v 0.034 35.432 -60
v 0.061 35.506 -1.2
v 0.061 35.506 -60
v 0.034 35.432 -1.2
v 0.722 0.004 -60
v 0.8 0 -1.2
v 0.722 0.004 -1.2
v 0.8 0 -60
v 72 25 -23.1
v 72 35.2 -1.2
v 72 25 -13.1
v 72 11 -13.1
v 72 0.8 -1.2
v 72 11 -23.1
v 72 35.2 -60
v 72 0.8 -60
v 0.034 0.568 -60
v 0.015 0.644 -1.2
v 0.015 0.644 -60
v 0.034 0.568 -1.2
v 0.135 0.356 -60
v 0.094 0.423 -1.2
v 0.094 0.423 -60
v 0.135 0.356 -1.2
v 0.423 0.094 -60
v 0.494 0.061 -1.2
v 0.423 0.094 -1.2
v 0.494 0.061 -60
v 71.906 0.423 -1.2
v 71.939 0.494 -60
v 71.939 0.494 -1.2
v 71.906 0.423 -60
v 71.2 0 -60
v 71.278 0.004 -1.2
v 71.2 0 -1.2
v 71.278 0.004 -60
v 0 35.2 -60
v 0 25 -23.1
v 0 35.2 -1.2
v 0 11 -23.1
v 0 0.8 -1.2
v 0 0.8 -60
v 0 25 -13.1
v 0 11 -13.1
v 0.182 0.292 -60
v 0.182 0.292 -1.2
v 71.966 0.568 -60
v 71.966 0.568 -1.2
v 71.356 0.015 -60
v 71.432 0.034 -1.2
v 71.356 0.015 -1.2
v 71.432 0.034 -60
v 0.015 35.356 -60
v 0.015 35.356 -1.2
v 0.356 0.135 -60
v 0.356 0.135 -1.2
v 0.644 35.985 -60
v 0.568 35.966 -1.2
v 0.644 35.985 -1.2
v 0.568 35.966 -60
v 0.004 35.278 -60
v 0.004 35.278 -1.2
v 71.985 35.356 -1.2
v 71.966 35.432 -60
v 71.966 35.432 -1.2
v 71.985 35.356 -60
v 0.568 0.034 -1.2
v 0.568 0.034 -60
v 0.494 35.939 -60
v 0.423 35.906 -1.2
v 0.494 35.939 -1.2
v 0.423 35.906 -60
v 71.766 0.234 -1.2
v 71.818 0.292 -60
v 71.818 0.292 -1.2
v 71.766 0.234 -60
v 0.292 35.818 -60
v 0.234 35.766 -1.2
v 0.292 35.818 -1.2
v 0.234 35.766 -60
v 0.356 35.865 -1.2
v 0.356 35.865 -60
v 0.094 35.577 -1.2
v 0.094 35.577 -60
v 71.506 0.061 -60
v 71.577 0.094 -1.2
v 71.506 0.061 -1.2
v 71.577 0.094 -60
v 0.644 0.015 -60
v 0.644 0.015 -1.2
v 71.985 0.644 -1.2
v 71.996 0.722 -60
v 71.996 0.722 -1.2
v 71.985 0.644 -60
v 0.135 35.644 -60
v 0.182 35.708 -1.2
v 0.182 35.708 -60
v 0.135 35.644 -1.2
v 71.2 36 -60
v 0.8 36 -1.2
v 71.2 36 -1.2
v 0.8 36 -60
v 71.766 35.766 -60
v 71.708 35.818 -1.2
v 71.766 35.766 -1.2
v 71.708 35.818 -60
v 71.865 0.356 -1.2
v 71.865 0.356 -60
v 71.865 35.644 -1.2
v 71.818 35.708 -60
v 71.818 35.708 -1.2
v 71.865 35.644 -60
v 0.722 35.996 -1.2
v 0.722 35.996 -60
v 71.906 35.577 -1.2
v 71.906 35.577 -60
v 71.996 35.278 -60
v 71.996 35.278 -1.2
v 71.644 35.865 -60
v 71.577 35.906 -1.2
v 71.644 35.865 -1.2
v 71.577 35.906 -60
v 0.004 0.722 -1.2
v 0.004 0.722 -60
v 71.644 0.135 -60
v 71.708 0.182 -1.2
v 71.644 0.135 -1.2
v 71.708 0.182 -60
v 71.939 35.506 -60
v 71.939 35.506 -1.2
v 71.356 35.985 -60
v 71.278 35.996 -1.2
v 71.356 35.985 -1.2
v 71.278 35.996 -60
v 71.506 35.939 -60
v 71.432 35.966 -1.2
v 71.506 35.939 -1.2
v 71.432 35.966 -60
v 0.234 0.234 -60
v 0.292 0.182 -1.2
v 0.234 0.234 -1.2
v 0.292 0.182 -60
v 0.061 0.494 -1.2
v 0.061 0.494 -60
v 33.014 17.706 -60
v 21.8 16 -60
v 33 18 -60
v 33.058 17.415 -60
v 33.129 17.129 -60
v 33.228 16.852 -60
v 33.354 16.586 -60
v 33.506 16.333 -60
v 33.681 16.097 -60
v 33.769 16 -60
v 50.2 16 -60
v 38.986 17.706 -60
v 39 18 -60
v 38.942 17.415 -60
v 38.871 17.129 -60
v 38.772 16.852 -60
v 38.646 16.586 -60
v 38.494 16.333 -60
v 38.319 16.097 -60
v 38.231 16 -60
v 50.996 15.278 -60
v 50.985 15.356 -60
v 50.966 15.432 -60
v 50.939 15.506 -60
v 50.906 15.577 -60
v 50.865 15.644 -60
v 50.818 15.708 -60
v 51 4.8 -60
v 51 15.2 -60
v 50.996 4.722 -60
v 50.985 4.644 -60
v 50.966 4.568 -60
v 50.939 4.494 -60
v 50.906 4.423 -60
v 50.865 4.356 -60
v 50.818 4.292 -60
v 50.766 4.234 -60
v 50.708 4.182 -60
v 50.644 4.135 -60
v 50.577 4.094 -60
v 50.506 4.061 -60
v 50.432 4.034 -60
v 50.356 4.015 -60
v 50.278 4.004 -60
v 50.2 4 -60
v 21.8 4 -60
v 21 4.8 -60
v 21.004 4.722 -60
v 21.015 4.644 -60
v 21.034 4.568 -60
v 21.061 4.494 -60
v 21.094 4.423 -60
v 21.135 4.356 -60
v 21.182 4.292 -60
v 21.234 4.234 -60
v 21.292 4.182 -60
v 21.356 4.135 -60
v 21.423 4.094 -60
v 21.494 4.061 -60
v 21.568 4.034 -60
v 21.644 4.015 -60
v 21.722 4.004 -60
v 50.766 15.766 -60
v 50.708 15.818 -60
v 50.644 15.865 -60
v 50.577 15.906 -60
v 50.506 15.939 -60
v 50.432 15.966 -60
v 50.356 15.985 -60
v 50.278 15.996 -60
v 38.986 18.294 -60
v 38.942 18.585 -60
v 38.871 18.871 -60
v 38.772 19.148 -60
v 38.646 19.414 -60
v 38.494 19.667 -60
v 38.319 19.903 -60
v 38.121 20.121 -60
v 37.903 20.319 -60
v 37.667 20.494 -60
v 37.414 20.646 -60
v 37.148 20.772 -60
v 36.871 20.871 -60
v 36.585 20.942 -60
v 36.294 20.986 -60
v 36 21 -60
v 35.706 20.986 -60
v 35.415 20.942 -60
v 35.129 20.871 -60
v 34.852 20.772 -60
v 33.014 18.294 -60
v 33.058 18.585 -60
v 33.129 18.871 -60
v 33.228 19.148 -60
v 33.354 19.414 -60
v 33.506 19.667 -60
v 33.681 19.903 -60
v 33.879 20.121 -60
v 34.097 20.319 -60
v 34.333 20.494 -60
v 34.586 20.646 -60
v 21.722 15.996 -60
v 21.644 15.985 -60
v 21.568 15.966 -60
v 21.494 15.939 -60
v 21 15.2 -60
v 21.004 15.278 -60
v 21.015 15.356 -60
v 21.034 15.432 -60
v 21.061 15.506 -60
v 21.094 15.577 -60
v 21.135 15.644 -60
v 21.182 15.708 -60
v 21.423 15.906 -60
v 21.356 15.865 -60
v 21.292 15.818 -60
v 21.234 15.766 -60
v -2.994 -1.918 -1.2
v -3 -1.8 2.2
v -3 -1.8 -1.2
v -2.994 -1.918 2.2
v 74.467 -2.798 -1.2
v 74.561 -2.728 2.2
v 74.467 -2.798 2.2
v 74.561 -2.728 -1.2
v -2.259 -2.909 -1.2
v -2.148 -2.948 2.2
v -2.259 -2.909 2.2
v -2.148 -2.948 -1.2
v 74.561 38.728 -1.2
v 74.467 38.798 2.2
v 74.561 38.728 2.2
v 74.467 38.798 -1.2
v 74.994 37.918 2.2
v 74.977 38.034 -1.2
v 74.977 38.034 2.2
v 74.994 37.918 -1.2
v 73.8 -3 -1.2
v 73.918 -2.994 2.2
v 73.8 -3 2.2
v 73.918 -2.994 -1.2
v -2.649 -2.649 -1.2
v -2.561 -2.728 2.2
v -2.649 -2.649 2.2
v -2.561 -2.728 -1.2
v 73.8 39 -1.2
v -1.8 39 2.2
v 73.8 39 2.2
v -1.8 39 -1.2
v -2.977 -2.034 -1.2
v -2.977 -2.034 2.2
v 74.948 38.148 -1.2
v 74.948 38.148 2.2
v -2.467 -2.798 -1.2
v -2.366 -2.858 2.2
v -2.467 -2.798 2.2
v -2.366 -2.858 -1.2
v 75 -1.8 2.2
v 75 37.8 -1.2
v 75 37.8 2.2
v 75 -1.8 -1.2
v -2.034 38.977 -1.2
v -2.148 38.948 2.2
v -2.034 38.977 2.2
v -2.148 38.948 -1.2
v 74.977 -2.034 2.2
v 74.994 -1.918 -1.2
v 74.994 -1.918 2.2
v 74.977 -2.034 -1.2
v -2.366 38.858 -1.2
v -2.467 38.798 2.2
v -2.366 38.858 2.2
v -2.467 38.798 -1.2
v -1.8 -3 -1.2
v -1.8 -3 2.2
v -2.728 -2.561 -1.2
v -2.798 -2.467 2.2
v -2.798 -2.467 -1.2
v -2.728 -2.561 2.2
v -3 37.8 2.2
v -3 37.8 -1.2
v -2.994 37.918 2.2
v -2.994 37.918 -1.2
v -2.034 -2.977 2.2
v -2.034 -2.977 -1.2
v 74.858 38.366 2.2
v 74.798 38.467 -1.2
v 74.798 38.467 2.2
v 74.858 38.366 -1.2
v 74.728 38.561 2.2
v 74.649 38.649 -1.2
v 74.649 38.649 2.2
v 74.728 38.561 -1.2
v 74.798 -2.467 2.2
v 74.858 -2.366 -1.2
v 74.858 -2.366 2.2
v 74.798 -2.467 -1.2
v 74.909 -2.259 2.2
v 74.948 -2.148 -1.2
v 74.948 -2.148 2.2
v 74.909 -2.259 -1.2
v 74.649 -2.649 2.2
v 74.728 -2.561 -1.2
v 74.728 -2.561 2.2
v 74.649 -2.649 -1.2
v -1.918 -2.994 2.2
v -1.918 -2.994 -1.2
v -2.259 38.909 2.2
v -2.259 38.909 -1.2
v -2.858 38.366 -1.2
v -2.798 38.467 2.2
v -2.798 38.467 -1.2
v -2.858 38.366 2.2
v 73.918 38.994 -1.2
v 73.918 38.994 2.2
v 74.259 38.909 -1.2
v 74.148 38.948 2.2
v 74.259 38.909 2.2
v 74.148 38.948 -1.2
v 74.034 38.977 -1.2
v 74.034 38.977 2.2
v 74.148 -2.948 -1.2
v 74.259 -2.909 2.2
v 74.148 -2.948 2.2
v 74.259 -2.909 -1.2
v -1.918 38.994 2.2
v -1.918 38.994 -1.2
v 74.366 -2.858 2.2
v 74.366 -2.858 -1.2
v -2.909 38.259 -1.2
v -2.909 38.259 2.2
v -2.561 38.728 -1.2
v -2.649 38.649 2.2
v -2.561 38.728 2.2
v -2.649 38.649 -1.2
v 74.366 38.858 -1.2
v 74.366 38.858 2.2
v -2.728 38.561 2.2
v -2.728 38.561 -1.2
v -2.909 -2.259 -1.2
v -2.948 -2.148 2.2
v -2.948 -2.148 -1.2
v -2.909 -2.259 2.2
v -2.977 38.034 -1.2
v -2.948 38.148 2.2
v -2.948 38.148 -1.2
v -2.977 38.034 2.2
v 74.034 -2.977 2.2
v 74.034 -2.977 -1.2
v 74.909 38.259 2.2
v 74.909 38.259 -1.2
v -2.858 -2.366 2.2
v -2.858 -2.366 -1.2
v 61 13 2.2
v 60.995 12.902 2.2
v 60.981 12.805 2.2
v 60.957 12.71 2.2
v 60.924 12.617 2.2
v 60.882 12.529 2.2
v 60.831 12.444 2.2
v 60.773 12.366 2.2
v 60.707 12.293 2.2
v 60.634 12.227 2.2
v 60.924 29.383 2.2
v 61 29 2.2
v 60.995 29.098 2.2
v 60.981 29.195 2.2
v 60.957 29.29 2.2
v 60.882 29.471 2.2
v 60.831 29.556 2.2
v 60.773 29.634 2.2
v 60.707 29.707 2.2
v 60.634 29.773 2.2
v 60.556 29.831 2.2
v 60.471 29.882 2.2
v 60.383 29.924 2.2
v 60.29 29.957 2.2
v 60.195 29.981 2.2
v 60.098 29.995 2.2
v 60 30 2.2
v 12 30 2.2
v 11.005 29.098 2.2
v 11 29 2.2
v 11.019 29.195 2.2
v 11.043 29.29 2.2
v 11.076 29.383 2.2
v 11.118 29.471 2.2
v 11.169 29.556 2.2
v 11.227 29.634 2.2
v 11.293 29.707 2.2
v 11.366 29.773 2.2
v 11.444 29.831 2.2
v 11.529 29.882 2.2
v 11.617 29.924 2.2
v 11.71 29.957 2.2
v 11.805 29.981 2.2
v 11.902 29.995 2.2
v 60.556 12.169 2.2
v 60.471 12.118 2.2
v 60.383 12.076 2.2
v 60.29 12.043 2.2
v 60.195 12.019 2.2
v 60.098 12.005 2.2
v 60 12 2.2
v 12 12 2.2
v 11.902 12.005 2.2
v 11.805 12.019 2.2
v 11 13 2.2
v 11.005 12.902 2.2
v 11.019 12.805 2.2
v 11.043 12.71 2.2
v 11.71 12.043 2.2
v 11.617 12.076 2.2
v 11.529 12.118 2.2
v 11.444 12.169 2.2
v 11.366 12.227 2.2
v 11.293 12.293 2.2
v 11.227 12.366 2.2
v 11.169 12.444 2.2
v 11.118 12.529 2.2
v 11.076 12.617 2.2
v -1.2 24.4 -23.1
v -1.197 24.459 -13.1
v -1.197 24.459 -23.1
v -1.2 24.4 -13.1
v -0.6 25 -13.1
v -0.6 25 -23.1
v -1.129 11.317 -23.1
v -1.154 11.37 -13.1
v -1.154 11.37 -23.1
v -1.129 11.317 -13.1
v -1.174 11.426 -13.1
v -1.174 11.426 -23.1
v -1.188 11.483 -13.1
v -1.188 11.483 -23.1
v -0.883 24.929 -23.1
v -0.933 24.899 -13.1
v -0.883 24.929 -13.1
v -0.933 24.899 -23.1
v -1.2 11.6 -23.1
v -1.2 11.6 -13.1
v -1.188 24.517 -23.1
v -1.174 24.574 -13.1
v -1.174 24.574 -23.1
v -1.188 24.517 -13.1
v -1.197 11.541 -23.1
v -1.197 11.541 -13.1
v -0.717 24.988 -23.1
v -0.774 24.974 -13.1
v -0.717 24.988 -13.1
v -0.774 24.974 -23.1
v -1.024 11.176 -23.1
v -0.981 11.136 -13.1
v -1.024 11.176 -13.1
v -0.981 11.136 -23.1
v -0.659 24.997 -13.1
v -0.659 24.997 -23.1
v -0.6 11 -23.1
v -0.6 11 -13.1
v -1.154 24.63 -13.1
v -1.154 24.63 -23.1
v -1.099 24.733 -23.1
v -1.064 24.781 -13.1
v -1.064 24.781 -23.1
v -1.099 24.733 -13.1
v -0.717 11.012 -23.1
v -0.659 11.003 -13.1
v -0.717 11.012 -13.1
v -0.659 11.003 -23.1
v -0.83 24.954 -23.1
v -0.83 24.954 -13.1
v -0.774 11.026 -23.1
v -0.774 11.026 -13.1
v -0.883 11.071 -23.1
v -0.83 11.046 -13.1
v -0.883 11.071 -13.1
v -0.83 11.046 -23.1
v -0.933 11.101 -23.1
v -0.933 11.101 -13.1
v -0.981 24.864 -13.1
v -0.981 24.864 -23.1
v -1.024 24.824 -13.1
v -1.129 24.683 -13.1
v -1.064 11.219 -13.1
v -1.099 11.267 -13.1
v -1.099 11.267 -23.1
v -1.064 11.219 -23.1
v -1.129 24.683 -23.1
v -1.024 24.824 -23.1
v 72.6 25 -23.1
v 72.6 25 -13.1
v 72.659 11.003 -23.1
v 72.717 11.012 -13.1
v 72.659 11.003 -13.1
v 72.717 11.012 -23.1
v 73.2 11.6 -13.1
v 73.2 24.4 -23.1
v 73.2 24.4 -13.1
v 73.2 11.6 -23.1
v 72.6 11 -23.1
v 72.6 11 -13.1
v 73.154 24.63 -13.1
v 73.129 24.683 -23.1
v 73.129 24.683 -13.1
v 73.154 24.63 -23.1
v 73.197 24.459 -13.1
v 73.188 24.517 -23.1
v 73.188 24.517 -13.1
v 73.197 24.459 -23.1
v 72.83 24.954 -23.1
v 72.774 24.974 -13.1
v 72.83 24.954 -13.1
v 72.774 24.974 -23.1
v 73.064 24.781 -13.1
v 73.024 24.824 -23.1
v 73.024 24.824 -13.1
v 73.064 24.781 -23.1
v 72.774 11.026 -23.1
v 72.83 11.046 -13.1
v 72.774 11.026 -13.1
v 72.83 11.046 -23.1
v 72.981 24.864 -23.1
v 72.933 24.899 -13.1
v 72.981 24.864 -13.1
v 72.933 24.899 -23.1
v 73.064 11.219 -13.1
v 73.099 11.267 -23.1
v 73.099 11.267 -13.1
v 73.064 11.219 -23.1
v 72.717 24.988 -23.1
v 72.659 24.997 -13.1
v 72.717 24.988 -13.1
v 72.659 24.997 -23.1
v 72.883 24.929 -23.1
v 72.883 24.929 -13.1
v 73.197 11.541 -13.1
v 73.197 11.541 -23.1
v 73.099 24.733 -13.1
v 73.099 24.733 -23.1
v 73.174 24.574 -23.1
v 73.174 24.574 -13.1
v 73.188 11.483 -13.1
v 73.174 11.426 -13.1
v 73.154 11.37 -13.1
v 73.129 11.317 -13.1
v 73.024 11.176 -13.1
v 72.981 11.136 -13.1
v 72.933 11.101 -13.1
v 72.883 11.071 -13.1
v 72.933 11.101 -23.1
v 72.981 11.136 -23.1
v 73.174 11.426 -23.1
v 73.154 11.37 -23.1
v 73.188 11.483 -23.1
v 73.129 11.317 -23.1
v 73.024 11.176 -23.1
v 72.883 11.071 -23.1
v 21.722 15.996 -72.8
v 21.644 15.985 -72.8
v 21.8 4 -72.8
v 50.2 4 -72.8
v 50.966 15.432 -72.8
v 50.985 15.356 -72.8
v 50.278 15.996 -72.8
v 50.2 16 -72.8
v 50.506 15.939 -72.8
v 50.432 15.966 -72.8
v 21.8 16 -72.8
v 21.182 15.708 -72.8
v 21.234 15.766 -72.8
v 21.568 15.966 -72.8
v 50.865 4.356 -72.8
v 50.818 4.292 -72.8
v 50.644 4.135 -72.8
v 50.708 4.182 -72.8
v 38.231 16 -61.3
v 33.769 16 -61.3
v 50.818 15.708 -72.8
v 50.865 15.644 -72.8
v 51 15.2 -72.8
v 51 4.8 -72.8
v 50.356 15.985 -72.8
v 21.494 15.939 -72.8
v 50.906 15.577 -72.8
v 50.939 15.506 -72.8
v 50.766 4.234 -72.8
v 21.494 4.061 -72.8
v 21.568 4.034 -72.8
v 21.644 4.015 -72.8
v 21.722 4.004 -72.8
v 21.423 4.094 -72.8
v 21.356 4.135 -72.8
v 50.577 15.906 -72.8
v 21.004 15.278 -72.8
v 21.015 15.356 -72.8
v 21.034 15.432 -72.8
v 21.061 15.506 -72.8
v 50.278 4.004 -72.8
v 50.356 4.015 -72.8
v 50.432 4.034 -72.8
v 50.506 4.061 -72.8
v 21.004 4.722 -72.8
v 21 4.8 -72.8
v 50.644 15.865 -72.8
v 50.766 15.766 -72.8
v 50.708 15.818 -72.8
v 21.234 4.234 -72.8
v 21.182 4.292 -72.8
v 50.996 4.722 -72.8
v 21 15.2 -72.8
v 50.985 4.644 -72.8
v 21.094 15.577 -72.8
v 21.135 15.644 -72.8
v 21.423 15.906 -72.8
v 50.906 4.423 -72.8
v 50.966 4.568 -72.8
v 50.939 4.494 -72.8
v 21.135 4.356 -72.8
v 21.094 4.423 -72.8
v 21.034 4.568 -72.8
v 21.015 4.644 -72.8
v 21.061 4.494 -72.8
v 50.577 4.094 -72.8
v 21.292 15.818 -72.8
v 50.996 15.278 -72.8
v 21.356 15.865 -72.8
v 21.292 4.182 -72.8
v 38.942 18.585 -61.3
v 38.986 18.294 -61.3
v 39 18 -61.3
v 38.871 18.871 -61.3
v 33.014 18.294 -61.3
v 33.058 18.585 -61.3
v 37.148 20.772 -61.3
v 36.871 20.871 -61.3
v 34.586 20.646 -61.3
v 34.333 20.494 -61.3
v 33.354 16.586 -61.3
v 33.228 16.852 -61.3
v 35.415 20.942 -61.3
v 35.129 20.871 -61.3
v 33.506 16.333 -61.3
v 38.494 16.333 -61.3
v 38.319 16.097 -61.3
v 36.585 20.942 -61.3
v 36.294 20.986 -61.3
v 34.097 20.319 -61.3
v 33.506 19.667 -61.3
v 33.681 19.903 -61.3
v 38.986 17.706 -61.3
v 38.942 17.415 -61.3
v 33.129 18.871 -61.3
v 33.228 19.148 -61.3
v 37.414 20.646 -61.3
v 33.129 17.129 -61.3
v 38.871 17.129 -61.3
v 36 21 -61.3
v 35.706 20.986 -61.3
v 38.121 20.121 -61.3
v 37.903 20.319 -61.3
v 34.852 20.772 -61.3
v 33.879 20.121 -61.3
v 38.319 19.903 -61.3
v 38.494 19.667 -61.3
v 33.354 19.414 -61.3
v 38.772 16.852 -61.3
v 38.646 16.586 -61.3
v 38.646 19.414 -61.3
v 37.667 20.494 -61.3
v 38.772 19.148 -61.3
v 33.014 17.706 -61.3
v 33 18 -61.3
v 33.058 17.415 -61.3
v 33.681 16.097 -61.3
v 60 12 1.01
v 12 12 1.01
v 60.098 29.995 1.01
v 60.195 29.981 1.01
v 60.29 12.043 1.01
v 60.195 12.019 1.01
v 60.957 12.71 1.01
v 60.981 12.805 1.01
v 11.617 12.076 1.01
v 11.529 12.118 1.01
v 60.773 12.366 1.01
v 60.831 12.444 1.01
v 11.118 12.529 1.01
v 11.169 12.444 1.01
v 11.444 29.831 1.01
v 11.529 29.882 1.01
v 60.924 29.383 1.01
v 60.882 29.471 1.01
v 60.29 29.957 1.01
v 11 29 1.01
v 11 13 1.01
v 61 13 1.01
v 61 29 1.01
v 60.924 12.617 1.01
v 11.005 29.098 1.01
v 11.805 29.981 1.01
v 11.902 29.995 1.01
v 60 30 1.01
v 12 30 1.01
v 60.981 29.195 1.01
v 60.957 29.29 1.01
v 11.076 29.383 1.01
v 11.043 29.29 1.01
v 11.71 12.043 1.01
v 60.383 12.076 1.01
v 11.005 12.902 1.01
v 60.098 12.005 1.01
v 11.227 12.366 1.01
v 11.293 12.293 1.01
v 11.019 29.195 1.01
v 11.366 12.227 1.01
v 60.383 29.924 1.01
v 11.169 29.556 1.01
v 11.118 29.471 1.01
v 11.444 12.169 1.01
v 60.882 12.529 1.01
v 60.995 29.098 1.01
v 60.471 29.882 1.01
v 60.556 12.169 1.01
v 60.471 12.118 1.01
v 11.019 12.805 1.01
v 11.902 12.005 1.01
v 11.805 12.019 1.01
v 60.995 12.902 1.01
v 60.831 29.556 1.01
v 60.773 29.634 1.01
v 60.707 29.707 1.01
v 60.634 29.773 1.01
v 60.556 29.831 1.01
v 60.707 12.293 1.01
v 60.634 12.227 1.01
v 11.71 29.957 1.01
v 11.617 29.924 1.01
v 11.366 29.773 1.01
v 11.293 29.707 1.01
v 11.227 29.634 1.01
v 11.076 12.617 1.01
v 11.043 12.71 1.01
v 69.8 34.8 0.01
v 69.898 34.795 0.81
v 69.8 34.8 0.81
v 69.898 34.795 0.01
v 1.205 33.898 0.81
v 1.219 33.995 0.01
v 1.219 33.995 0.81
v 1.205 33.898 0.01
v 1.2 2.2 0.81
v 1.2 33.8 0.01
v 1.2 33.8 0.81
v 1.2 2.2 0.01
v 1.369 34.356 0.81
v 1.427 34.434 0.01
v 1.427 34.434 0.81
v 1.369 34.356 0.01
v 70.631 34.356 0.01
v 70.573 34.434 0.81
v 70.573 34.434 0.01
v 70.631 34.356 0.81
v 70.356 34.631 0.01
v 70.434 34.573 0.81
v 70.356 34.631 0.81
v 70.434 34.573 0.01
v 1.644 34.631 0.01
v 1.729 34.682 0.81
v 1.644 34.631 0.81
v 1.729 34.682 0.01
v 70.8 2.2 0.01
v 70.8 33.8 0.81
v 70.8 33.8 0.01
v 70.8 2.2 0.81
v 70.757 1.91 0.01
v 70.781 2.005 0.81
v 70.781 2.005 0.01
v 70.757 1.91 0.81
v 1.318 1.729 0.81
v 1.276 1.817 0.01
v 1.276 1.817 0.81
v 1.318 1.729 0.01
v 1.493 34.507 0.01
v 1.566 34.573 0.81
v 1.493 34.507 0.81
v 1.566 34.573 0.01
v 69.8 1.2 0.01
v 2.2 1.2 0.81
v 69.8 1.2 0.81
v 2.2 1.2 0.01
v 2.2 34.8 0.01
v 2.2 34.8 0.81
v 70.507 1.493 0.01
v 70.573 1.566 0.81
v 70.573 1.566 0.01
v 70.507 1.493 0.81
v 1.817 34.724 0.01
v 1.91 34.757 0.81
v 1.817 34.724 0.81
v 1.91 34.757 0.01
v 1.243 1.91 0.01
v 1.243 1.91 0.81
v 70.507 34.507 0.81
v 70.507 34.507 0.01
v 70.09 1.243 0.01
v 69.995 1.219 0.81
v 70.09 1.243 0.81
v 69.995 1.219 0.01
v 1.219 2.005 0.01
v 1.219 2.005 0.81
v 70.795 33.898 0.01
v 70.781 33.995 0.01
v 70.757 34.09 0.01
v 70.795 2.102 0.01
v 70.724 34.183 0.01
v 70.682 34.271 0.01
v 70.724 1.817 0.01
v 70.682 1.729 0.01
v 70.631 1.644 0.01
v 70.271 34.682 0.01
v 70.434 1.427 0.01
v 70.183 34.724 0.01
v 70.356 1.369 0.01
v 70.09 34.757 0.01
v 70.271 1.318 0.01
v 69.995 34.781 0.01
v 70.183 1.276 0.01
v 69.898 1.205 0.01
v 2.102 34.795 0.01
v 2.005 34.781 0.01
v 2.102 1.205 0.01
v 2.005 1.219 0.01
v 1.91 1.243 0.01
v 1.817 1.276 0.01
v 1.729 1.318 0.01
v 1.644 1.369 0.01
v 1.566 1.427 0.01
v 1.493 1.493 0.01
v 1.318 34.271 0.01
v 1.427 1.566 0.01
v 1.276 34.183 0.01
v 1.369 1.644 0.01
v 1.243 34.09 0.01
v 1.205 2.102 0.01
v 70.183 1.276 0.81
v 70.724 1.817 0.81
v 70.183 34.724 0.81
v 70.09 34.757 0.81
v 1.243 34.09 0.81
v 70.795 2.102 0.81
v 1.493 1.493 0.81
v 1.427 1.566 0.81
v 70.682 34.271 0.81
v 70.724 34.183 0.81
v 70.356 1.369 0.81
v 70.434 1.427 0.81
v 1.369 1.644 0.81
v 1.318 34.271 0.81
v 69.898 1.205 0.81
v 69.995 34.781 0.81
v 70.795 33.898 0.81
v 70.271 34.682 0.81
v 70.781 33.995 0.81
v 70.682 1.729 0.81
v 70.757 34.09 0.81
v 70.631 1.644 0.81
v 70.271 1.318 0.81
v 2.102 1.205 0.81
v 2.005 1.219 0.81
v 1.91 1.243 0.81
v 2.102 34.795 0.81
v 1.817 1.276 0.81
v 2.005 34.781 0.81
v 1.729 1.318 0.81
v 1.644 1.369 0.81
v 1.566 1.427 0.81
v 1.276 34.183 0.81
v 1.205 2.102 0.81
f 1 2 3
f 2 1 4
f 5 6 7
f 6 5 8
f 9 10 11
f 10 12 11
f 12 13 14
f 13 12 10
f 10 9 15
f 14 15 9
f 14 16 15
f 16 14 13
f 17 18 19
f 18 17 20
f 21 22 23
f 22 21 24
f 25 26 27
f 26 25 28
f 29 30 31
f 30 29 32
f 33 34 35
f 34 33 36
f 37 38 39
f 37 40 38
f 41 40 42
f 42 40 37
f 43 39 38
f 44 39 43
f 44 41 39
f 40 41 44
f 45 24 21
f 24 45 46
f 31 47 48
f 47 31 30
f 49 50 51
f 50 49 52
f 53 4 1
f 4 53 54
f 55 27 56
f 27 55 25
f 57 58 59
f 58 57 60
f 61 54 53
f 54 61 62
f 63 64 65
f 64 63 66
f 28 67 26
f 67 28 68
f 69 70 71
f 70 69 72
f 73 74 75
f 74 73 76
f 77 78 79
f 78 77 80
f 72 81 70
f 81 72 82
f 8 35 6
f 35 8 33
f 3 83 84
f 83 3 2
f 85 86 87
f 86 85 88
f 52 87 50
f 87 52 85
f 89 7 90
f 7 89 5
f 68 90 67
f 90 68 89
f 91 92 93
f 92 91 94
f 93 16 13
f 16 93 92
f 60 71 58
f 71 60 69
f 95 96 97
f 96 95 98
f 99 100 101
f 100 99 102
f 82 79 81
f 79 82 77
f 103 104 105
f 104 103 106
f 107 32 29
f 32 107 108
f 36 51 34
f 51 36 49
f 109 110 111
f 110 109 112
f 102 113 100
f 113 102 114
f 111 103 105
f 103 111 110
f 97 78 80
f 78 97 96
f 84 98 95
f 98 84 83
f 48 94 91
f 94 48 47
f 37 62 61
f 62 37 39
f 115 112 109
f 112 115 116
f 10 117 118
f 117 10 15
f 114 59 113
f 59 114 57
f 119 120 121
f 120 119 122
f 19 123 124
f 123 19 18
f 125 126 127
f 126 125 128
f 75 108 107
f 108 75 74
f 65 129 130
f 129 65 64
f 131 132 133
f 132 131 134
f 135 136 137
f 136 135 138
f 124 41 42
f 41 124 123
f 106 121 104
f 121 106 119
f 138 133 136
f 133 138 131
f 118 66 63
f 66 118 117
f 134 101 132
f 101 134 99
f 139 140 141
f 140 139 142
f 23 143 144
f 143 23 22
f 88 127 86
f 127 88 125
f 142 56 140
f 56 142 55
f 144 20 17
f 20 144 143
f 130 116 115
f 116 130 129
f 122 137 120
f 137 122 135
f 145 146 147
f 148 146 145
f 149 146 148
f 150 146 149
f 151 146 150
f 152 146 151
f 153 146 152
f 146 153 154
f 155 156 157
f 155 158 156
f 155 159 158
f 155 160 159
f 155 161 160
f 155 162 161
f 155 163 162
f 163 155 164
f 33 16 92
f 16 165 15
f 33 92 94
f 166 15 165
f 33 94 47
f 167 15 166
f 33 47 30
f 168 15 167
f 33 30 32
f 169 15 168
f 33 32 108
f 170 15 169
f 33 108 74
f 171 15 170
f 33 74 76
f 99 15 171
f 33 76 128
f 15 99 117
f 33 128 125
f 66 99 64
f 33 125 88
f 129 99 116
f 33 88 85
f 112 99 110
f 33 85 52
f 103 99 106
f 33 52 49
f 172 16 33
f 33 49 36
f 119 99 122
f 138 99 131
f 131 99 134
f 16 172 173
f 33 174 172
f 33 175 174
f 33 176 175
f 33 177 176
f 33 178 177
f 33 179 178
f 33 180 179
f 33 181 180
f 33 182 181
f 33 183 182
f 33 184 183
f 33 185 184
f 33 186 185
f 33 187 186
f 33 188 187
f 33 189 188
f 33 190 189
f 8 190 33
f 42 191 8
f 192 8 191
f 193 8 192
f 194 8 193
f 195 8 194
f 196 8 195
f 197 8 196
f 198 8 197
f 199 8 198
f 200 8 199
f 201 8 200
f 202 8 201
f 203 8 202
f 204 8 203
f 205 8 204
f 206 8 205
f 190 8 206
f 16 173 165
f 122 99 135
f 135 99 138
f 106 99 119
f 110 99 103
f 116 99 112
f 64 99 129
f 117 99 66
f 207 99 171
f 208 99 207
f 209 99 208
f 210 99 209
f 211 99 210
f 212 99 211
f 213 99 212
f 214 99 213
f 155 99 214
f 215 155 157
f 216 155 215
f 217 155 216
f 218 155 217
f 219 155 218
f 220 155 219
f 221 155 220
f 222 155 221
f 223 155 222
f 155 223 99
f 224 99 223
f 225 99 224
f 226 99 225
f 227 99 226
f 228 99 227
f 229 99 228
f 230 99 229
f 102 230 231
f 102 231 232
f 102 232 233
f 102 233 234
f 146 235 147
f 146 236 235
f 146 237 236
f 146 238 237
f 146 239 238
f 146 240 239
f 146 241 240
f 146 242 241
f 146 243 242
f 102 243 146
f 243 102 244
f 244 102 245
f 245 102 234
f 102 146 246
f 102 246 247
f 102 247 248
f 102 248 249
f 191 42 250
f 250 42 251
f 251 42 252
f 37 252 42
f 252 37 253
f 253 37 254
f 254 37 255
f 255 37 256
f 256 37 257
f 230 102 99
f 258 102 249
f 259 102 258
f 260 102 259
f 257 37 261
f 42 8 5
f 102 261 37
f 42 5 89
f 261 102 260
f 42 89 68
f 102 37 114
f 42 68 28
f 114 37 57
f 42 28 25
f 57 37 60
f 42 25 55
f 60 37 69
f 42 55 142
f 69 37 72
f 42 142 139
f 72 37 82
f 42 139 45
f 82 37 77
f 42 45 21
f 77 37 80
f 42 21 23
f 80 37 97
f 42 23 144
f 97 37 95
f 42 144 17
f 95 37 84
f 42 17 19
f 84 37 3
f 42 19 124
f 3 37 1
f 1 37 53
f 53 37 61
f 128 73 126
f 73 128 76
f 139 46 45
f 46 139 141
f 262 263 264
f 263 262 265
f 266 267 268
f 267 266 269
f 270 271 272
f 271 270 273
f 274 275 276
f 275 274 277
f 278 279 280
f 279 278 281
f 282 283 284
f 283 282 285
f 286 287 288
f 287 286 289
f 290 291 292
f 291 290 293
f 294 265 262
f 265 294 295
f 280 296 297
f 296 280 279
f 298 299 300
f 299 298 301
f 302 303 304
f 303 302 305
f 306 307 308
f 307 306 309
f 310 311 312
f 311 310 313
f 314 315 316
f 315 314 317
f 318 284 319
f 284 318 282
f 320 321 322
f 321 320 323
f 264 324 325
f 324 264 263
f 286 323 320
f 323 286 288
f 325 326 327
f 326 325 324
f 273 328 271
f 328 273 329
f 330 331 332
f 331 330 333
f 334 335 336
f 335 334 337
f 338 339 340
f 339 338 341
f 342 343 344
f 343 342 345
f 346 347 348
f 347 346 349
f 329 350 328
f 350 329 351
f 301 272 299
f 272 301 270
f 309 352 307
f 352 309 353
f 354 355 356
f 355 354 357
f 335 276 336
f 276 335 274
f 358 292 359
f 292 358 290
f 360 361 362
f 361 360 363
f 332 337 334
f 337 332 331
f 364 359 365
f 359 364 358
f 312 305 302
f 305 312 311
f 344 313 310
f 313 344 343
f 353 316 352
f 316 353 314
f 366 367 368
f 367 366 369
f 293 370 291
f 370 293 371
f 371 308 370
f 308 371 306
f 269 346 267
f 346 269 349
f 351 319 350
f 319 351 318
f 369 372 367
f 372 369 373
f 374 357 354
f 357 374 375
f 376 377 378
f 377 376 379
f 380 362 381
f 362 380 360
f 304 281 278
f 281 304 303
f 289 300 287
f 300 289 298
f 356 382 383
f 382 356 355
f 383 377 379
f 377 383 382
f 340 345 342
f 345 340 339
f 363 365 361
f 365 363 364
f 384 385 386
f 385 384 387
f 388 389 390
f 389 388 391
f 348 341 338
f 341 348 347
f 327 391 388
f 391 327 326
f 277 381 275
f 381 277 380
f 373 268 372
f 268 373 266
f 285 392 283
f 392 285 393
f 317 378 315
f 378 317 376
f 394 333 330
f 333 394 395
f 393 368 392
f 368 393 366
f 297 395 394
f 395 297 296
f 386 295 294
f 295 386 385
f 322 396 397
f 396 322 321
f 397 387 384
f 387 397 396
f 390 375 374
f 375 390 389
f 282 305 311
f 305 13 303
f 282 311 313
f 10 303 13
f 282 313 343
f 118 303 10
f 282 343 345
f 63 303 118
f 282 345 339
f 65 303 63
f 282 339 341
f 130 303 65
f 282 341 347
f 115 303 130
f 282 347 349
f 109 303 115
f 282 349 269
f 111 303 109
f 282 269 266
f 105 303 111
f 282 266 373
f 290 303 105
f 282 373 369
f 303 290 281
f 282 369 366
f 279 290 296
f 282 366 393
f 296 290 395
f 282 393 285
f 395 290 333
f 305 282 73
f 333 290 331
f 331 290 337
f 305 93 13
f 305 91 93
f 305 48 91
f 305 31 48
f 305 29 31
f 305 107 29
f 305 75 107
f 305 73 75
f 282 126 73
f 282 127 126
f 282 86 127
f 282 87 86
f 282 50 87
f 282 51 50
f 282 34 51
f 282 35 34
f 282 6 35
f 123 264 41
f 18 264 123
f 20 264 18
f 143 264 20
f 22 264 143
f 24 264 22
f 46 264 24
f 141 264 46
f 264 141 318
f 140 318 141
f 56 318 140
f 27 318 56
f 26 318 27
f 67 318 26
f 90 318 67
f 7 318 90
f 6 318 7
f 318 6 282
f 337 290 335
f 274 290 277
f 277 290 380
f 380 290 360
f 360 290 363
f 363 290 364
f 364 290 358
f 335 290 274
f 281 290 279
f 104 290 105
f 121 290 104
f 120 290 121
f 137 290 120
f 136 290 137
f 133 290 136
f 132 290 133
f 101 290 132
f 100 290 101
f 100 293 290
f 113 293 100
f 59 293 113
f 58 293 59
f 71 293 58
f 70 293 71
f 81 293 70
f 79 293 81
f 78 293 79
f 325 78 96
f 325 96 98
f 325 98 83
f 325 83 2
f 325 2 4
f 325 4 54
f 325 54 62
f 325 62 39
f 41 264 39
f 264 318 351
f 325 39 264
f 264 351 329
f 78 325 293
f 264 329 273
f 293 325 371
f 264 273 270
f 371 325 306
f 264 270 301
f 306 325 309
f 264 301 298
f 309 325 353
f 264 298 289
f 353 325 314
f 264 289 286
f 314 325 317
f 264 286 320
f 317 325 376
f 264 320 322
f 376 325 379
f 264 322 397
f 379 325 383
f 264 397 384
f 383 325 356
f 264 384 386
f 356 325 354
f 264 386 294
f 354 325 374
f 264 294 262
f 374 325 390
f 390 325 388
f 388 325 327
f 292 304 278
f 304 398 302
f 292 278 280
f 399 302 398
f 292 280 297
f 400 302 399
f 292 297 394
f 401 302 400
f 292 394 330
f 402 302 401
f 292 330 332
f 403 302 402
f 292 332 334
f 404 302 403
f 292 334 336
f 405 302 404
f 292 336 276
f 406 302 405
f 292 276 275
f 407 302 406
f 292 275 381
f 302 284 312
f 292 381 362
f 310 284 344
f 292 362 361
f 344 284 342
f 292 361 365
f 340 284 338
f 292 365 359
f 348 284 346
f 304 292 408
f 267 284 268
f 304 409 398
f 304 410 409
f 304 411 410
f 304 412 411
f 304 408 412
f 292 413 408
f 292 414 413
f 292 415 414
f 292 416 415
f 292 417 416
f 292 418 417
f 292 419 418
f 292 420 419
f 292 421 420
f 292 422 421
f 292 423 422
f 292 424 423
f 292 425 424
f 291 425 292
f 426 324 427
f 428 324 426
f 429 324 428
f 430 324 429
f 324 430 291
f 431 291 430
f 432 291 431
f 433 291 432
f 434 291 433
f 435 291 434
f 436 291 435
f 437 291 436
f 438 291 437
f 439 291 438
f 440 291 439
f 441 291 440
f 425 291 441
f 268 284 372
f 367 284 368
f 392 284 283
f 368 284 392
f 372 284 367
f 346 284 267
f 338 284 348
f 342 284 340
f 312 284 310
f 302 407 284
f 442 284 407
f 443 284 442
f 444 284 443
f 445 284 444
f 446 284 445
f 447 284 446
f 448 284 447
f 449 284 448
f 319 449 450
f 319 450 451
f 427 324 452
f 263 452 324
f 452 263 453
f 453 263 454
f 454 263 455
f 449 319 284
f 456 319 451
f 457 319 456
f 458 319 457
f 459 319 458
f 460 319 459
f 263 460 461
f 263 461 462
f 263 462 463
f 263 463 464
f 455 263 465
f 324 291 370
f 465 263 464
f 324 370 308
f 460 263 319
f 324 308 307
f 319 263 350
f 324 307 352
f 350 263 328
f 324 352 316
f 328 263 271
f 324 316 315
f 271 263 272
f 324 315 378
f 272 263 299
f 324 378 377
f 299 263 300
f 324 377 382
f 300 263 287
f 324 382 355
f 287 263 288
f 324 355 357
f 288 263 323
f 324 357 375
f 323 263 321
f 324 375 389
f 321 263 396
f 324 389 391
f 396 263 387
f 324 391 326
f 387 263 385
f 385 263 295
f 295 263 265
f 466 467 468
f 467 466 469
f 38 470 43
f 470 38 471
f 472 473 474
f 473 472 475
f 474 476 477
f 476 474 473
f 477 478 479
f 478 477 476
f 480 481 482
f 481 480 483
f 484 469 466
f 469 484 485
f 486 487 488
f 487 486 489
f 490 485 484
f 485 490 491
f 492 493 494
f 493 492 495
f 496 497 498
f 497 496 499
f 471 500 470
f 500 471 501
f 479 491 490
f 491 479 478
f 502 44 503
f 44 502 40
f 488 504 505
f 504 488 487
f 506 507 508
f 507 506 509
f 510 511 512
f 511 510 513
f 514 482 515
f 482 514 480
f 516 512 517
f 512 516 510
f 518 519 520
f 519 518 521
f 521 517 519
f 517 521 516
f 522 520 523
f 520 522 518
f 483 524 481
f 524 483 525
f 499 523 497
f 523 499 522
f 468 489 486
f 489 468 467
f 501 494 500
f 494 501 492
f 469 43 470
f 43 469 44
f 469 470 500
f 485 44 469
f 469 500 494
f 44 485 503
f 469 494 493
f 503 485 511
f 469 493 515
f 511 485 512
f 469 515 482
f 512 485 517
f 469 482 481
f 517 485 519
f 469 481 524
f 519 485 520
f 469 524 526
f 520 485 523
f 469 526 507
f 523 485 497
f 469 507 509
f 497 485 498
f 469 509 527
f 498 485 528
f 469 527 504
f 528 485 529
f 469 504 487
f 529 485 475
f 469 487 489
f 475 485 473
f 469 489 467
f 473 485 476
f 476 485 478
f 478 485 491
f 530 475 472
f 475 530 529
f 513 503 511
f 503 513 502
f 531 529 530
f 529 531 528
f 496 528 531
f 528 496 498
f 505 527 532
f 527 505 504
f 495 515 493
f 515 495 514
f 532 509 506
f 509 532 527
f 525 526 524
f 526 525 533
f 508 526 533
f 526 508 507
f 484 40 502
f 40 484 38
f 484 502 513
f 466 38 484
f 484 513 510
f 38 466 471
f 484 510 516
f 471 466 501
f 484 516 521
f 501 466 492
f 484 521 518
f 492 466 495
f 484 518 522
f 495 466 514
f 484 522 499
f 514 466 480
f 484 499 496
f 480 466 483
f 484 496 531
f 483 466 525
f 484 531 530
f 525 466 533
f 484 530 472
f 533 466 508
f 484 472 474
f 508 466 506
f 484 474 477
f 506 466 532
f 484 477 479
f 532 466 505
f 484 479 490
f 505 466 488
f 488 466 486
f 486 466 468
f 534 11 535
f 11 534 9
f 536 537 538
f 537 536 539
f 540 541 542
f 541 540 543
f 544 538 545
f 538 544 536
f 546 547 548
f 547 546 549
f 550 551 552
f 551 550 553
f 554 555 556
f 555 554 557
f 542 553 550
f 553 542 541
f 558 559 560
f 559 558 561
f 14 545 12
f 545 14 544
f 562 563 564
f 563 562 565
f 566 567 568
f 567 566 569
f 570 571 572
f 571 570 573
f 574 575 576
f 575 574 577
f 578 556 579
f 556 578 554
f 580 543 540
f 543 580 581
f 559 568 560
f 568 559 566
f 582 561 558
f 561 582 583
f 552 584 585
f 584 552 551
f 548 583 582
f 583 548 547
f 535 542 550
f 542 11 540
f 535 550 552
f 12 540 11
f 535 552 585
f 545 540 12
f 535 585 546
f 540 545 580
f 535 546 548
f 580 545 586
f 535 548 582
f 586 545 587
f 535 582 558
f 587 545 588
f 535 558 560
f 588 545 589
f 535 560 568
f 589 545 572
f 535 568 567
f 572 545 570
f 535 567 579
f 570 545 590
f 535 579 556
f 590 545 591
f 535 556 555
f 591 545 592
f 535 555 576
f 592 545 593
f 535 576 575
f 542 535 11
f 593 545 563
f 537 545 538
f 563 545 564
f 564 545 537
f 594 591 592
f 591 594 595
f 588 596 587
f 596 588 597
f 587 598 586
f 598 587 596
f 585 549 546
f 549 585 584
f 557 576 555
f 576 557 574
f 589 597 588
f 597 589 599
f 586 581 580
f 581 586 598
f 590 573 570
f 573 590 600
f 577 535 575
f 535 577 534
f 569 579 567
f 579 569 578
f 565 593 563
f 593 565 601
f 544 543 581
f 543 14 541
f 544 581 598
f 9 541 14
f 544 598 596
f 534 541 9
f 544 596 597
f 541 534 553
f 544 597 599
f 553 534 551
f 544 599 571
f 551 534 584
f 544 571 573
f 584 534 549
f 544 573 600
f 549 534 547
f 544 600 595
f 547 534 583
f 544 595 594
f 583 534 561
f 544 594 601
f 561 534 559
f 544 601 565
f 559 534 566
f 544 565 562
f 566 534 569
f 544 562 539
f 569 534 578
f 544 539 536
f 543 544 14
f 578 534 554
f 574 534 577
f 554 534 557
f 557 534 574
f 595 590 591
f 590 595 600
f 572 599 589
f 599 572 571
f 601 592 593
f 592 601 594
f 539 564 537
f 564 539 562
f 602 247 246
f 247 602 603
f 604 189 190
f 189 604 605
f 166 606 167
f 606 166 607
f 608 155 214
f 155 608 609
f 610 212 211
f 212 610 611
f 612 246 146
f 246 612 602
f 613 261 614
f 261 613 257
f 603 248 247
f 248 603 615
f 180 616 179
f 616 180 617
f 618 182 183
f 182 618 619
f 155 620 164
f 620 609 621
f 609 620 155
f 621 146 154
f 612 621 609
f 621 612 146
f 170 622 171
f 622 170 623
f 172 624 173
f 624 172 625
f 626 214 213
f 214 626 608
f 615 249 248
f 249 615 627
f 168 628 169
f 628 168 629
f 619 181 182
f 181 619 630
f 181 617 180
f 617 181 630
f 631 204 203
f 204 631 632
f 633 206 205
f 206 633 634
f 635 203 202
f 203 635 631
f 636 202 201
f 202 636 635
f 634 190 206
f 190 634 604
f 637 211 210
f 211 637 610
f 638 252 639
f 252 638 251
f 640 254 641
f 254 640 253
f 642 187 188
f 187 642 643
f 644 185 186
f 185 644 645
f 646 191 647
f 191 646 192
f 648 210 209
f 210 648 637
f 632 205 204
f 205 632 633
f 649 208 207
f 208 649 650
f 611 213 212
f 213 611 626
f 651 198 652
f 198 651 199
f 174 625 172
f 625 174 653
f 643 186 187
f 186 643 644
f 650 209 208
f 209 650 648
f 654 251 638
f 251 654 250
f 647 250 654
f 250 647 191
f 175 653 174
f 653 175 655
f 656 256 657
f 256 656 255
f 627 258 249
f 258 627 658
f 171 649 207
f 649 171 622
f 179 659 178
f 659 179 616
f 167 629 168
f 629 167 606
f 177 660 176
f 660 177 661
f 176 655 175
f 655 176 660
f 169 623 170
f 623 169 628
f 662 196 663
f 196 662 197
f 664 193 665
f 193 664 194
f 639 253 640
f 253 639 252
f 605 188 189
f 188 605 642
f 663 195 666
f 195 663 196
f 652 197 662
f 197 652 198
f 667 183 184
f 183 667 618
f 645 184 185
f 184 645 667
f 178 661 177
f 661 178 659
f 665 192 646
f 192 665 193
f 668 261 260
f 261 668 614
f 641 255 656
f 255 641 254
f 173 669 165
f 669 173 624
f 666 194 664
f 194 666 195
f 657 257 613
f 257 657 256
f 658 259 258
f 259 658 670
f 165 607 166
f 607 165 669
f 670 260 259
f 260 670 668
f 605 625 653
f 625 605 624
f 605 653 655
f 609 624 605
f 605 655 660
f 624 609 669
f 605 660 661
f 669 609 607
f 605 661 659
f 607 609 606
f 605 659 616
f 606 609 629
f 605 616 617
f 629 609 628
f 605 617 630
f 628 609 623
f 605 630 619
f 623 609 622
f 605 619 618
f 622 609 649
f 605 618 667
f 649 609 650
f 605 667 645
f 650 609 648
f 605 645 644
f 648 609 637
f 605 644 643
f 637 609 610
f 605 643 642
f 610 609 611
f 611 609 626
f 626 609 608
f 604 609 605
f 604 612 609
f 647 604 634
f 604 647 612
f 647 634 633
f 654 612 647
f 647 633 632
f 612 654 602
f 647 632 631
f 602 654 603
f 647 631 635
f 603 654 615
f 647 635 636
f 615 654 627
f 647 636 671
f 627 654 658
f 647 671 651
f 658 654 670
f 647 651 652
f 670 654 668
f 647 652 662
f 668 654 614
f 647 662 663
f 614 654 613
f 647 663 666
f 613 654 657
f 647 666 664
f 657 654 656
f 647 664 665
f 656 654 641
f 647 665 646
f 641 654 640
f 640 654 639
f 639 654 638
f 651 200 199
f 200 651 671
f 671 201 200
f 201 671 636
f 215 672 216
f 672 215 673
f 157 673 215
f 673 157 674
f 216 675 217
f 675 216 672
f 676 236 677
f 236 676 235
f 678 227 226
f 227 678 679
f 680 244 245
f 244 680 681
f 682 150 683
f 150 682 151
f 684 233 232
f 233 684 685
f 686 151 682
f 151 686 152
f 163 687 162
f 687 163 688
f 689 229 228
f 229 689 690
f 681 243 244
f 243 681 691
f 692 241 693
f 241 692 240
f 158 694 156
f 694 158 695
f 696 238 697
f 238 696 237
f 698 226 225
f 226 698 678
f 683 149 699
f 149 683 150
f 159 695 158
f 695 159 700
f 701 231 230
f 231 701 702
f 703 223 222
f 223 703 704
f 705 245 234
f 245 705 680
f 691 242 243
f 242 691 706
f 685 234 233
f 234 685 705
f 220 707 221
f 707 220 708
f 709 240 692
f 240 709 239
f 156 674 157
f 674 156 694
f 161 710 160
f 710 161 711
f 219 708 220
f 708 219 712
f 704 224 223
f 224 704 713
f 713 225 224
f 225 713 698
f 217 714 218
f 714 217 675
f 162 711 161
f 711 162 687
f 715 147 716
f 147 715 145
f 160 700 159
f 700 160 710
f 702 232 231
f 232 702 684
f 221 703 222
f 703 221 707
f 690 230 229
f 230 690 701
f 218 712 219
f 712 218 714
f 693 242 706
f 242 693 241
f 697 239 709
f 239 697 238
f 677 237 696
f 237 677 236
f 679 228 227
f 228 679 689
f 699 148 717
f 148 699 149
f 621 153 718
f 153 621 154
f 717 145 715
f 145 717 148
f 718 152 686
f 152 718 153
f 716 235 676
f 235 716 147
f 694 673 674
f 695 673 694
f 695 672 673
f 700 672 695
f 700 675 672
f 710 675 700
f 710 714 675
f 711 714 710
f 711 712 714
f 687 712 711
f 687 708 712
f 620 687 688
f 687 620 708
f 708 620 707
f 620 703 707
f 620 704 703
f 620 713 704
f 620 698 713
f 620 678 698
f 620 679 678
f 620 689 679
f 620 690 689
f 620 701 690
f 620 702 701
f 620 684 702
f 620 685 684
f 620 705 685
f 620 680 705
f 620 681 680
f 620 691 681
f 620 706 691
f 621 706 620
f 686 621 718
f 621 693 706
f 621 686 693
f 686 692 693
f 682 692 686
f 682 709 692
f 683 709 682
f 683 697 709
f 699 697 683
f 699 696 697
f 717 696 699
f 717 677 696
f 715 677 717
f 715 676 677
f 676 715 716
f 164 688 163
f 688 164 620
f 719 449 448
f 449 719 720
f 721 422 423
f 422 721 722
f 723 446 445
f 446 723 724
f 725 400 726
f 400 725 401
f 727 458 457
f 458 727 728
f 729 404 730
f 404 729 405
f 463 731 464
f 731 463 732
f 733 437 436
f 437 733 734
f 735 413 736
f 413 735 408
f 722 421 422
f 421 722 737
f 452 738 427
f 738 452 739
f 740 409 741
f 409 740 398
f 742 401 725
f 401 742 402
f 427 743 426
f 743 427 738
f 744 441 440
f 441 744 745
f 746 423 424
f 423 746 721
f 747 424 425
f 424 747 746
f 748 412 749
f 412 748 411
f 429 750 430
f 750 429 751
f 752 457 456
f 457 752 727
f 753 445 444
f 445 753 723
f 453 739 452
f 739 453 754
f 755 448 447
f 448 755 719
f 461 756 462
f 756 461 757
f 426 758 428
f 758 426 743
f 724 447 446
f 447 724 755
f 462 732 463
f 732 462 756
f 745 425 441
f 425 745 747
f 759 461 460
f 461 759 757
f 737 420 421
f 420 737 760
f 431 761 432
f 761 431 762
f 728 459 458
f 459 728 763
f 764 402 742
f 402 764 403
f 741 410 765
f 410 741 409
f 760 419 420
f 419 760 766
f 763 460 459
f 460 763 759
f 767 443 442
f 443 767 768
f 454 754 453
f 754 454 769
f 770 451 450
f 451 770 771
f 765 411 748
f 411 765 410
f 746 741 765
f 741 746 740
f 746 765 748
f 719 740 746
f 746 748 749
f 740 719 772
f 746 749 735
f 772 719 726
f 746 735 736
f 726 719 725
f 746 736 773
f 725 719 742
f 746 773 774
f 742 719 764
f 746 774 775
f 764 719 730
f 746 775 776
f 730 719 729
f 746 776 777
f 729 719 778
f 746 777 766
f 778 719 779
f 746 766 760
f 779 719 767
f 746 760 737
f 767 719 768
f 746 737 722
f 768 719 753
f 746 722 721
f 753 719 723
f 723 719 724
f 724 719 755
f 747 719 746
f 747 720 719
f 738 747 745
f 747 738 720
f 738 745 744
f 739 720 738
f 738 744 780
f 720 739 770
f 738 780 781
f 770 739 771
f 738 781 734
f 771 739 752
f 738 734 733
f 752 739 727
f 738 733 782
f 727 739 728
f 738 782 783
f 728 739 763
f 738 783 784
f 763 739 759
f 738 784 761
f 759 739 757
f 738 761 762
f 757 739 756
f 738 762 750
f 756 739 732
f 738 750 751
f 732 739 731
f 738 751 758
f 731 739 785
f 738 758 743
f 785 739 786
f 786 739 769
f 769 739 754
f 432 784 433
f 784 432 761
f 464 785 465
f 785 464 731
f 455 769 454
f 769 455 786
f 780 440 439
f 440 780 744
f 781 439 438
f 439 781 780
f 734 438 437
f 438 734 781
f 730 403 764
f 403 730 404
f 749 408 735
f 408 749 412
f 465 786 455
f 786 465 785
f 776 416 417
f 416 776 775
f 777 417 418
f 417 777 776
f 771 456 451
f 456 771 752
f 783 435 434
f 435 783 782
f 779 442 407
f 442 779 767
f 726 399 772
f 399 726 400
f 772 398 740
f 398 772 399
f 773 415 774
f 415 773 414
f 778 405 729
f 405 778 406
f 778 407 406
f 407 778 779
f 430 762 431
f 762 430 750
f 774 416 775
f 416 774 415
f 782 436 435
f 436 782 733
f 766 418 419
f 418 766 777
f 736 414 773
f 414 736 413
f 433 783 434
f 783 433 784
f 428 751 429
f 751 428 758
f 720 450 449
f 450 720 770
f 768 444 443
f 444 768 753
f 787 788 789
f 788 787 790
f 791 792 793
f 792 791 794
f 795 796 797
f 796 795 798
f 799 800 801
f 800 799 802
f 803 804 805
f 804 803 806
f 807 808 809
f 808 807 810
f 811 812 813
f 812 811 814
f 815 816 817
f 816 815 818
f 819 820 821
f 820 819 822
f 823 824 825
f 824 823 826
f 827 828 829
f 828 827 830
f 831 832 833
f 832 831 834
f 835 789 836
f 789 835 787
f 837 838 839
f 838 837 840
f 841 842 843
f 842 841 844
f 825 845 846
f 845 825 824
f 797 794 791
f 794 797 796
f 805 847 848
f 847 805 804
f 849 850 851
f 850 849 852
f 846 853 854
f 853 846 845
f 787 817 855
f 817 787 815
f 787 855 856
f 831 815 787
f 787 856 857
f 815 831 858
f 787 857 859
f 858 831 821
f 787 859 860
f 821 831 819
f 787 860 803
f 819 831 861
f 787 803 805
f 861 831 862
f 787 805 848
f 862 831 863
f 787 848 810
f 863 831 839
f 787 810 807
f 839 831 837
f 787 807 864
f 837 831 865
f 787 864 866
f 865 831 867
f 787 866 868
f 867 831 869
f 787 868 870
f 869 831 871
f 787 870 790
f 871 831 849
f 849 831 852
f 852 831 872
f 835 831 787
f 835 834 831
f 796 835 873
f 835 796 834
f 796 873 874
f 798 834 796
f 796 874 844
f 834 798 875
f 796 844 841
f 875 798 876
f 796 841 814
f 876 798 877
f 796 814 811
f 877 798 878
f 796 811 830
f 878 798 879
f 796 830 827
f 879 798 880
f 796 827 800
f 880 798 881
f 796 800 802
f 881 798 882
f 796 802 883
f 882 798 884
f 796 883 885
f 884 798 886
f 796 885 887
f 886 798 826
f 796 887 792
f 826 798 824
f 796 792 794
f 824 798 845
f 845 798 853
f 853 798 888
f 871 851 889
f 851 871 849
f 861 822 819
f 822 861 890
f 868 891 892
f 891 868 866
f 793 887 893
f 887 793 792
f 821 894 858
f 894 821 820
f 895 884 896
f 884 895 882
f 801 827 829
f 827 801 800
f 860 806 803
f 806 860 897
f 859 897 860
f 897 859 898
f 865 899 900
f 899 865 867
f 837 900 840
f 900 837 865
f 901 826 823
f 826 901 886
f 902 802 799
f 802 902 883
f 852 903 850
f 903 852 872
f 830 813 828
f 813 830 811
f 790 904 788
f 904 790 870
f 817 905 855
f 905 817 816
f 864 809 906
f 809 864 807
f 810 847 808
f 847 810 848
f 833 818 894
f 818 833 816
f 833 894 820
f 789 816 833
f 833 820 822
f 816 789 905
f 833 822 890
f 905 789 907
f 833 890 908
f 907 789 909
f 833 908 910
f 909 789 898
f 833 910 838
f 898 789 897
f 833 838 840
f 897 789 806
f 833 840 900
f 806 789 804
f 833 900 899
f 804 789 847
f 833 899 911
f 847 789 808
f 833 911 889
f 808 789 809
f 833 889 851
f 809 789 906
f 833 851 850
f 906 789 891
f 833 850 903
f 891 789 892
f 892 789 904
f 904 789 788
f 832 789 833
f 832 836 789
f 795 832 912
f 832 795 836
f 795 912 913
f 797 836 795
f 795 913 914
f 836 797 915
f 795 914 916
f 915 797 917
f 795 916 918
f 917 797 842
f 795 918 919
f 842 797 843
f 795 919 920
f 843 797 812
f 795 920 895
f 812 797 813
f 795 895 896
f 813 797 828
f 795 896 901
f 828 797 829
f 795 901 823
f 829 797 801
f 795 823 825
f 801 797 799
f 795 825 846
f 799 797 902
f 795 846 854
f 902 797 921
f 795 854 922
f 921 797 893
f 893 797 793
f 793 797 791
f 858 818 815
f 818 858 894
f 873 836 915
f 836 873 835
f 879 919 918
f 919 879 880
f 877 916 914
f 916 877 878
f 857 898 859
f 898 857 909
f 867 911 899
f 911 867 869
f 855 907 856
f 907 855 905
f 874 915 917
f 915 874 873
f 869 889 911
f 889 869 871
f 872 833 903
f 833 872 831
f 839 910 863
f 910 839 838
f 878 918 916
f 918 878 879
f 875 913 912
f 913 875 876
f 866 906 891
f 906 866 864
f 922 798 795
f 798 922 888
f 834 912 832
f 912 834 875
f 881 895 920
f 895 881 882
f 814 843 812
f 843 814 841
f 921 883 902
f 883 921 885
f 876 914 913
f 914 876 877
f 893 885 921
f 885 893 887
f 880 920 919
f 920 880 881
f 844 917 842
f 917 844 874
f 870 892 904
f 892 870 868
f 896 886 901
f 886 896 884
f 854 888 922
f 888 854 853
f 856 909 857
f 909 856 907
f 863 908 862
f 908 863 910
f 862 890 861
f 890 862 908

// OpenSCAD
$fn = 64;

// Peacefair PZEM-021 (approximate) panel meter solid model
// Coordinate system: X=width, Y=height, Z=depth (front at Z=0, rear negative)

// -------------------- Parameters --------------------
meter_w = 72;
meter_h = 36;
meter_d = 60;

// Front bezel
bezel_t = 2.2;
bezel_over = 3.0;          // bezel overhang beyond body on all sides
bezel_r = 1.2;             // bezel corner radius

// Body (insert) with slight draft/rounding
body_r = 0.8;

// Display window recess (not a cut-through)
win_w = 50;
win_h = 18;
win_margin_top = 6;        // from top edge of body opening area
win_recess = 1.2;

// Button (front face)
btn_d = 6.0;
btn_h = 1.6;
btn_y_from_bottom = 7.0;   // from bottom edge of body opening area

// Rear terminal block (typical)
term_w = 30;
term_h = 12;
term_d = 14;
term_inset_from_bottom = 4; // from bottom of body
term_inset_from_rear = 0;   // flush to rear face

// Mounting clips (side spring clips)
clip_w = 10;
clip_h = 14;
clip_t = 2.2;
clip_z_pos = 22;           // distance from front along depth where clips sit
clip_y_center = 0;         // centered vertically
clip_overlap = 1.0;        // overlap into body for connectivity

// Small rear strain relief / bump (centered)
bump_d = 6;
bump_h = 2.5;

// Panel lip / step (front face detail)
lip_inset = 1.2;
lip_depth = 0.8;

// Connectivity overlap (1-2mm) to guarantee unions
conn_ov = 1.2;

// -------------------- Helpers --------------------
module rrect(size=[10,10,10], r=1, center=false) {
    // Rounded rectangle prism via hull of cylinders
    sx = size[0]; sy = size[1]; sz = size[2];
    rr = min(r, min(sx, sy)/2);
    translate(center ? [-sx/2, -sy/2, -sz/2] : [0,0,0])
        hull() {
            for (ix = [rr, sx-rr])
                for (iy = [rr, sy-rr])
                    translate([ix, iy, 0]) cylinder(r=rr, h=sz);
        }
}

module panel_meter() {
    // Build as one connected solid: union of all positive geometry,
    // then subtract recesses (window + lip step).
    difference() {
        union() {
            // Main body (insert) behind bezel: front at Z=0, rear at Z=-meter_d
            translate([0, 0, -meter_d])
                rrect([meter_w, meter_h, meter_d], r=body_r, center=false);

            // Front bezel plate (overhangs body)
            // Ensure it slightly overlaps into the body so it is guaranteed connected.
            translate([-bezel_over, -bezel_over, -conn_ov])
                rrect([meter_w + 2*bezel_over, meter_h + 2*bezel_over, bezel_t + conn_ov], r=bezel_r, center=false);

            // Side mounting clips (left/right), connected with overlap into body
            clip_z = -clip_z_pos;
            clip_y = (meter_h/2) - (clip_h/2) + clip_y_center;

            // Left clip (overlaps into body by clip_overlap)
            translate([-clip_t + clip_overlap, clip_y, clip_z - clip_t/2])
                rrect([clip_t, clip_h, clip_w], r=0.6, center=false);

            // Right clip (overlaps into body by clip_overlap)
            translate([meter_w - clip_overlap, clip_y, clip_z - clip_t/2])
                rrect([clip_t, clip_h, clip_w], r=0.6, center=false);

            // Rear terminal block (connected to rear face with slight overlap)
            term_z0 = -meter_d - term_inset_from_rear; // rear face plane
            translate([(meter_w - term_w)/2, term_inset_from_bottom, term_z0 - term_d + conn_ov])
                rrect([term_w, term_h, term_d], r=0.8, center=false);

            // Rear center bump/strain relief (connected to rear face)
            translate([meter_w/2, meter_h/2, -meter_d - bump_h + conn_ov])
                cylinder(d=bump_d, h=bump_h, center=false);

            // Front button (blue circular feature) - FIXED:
            // Center it on the front face and embed it into the bezel by 1-2mm.
            // This guarantees it is not floating/offset and is physically attached.
            btn_x = meter_w/2;
            btn_y = btn_y_from_bottom;
            translate([btn_x, btn_y, -conn_ov])
                cylinder(d=btn_d, h=btn_h + conn_ov, center=false);
        }

        // Display window recess on bezel/front (not through)
        // Positioned near top, centered in X.
        win_x0 = (meter_w - win_w)/2;
        win_y0 = meter_h - win_margin_top - win_h;
        translate([win_x0, win_y0, bezel_t - win_recess + 0.01])
            rrect([win_w, win_h, win_recess + 0.2], r=1.0, center=false);

        // Front lip step (subtle inset rectangle) to give face definition
        translate([lip_inset, lip_inset, 0.01])
            rrect([meter_w - 2*lip_inset, meter_h - 2*lip_inset, lip_depth], r=1.0, center=false);
    }
}

panel_meter();
